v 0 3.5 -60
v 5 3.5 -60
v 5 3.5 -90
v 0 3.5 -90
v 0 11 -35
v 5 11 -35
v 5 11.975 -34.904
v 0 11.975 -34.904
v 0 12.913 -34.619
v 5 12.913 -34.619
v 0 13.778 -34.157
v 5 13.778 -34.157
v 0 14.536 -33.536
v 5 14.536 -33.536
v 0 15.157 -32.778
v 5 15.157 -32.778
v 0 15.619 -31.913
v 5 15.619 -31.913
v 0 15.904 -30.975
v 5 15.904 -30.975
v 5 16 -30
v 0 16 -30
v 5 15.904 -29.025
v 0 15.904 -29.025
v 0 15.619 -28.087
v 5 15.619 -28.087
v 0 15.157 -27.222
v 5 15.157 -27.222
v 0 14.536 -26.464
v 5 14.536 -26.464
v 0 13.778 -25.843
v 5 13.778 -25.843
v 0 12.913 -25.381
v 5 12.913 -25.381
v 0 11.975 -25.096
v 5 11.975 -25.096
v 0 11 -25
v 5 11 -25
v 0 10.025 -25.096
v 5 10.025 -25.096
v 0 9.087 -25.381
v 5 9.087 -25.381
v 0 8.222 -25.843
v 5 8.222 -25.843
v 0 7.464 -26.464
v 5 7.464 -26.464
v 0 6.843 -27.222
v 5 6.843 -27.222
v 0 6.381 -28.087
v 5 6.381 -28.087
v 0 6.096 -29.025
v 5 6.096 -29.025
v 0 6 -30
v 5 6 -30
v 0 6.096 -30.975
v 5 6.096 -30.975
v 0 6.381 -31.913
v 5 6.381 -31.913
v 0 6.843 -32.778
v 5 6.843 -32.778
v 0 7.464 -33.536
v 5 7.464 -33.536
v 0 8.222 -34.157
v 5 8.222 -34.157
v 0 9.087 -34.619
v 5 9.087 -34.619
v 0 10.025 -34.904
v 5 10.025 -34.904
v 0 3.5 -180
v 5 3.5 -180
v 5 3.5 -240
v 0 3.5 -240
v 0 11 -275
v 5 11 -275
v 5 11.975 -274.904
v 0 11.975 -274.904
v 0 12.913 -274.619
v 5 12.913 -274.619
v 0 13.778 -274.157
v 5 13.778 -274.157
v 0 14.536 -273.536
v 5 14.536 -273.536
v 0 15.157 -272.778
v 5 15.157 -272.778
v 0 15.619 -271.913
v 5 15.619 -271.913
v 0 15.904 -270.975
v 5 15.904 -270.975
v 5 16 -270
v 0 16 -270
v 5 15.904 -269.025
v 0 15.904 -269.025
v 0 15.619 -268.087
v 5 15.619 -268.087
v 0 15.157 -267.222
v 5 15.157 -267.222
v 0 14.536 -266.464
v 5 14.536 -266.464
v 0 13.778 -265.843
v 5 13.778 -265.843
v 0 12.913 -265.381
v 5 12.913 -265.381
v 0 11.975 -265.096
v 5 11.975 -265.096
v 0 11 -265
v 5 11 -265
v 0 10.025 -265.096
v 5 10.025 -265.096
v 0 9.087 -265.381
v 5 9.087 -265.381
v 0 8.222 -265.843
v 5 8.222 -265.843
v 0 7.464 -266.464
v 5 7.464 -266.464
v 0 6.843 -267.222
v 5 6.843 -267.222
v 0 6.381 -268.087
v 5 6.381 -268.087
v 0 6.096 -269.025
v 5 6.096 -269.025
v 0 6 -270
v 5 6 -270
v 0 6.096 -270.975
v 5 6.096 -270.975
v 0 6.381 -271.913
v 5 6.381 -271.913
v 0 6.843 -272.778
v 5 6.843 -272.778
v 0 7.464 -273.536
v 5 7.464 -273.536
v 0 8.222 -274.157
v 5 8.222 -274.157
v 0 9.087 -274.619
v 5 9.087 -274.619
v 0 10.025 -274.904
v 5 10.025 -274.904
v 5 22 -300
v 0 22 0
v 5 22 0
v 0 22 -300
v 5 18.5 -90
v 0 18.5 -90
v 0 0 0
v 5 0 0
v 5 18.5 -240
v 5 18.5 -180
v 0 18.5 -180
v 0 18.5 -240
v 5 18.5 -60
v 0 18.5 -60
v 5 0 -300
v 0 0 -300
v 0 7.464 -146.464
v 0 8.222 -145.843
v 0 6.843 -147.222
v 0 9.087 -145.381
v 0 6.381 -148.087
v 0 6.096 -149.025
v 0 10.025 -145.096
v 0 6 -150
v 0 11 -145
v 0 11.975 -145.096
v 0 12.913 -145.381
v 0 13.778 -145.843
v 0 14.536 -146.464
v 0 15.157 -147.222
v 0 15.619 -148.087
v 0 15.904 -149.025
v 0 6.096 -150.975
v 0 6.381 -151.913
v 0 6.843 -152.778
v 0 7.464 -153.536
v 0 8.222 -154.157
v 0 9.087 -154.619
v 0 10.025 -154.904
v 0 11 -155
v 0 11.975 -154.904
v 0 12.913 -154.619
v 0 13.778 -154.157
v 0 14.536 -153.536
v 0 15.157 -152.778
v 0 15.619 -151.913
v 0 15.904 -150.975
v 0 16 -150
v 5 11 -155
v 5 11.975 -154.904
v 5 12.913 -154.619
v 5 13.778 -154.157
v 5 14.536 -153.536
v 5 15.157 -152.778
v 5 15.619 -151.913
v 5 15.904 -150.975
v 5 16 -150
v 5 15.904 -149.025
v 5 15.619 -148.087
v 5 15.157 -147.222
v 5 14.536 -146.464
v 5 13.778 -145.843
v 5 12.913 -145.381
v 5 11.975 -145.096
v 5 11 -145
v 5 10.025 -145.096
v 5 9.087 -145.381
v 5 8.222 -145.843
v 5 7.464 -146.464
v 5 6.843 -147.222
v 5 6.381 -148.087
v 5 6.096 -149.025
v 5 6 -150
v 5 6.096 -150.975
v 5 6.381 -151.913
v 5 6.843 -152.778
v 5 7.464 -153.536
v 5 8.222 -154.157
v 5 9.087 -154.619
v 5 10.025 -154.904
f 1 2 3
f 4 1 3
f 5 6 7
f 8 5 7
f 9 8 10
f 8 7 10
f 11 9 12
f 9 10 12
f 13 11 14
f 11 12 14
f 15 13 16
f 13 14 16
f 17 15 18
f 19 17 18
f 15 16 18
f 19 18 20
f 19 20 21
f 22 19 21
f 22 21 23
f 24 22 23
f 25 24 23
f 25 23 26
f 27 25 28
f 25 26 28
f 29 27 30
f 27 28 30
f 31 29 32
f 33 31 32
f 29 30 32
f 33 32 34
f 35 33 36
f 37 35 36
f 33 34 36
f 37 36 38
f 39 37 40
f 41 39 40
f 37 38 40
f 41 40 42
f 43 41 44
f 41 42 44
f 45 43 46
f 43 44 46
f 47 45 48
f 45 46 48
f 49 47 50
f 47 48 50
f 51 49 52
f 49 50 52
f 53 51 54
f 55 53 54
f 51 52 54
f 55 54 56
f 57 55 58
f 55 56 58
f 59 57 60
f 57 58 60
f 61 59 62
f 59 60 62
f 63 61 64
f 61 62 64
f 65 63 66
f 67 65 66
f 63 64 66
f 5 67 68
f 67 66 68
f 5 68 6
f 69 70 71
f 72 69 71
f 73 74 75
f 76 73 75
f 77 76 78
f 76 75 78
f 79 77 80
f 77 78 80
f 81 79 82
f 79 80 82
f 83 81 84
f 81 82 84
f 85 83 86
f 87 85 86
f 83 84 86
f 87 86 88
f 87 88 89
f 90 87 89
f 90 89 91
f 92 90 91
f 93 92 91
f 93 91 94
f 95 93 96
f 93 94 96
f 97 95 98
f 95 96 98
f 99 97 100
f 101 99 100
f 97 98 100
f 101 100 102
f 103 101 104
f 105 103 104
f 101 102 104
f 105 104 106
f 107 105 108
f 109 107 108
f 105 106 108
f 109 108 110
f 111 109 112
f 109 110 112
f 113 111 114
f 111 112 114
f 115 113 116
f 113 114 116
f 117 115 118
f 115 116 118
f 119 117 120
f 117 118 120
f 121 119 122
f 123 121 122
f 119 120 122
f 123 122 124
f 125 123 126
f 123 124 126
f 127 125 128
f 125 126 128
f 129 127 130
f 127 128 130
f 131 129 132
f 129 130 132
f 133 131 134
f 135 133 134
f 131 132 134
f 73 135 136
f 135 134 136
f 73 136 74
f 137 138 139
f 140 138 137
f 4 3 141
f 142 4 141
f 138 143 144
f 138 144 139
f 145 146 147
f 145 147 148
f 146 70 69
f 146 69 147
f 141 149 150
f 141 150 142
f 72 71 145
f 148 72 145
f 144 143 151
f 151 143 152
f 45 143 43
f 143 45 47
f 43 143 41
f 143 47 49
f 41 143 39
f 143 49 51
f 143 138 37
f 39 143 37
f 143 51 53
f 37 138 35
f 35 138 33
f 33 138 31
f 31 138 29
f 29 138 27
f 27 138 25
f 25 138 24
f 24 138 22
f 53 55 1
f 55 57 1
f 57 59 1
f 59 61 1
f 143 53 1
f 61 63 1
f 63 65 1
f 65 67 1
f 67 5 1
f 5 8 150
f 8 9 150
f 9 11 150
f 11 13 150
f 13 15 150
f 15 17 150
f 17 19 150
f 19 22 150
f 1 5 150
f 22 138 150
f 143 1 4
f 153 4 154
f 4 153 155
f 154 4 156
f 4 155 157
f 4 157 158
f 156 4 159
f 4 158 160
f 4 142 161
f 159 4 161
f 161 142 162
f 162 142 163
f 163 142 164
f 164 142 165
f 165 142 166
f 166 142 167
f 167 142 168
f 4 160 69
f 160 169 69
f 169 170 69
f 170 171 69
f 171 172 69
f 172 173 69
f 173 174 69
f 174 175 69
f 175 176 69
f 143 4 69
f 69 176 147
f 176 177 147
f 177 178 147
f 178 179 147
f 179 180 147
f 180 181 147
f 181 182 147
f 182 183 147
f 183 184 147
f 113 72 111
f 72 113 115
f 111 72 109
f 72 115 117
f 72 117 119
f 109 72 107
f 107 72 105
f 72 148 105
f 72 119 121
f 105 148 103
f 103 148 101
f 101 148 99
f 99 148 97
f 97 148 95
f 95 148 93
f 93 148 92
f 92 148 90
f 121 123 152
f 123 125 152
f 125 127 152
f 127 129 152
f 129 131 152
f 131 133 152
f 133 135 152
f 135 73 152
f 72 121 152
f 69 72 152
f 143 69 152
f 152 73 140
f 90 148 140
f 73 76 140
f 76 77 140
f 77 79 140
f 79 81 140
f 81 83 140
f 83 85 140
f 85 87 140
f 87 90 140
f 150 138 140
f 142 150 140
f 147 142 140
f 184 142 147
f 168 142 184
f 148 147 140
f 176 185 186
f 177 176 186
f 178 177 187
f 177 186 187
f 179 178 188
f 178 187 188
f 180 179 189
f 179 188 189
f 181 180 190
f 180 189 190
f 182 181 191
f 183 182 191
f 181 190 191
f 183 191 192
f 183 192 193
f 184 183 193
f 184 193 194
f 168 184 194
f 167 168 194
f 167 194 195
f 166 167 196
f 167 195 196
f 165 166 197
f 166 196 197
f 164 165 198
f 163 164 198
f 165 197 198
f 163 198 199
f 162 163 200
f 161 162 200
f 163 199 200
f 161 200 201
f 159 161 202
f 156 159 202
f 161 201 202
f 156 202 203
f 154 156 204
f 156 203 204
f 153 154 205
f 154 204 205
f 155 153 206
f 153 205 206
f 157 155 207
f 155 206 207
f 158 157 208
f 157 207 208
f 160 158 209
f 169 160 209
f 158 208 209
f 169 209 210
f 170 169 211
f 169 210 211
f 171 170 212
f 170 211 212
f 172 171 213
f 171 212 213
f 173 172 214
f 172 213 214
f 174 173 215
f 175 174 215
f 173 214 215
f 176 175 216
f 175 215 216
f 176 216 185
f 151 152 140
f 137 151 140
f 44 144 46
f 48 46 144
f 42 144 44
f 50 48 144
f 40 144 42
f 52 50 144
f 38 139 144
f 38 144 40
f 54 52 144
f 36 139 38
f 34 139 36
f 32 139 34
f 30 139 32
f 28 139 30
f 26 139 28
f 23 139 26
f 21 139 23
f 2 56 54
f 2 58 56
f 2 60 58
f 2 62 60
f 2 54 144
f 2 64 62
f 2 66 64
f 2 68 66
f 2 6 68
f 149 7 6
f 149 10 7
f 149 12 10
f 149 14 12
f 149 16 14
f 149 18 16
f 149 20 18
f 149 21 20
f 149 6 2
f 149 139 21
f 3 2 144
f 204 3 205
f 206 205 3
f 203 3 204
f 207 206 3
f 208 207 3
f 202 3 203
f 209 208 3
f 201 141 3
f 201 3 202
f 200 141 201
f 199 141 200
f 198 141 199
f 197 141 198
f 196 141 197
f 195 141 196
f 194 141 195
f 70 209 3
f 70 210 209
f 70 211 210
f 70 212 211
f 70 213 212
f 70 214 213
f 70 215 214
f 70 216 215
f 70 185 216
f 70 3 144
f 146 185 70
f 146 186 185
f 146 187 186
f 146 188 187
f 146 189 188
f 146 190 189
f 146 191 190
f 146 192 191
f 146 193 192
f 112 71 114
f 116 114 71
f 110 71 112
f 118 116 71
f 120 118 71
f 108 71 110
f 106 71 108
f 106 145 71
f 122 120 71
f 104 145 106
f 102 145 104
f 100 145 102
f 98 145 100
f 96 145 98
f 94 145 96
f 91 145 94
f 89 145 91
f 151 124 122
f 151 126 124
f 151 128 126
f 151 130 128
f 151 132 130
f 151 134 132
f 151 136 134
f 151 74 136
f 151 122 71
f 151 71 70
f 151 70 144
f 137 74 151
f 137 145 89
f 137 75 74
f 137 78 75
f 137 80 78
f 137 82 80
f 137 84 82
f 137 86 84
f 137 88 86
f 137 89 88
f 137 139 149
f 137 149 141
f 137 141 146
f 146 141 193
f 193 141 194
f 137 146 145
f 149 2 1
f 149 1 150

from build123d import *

# Parameters (mm, degrees)
SKETCH1_W           = 300
SKETCH1_H           = 22
BOSS_EXTRUDE1_DEPTH = 5
SKETCH2_R           = 5
SKETCH2_W           = 30
SKETCH2_H           = 15
SKETCH2_W_2         = 60
CUT_EXTRUDE1_DEPTH  = 5


with BuildPart() as part:
    # Sketch1 → Boss-Extrude1 (new body)
    with BuildSketch(Plane(origin=(0, 0, 0), x_dir=(0, 0, -1), z_dir=(1, 0, 0))):
        with Locations((150, 11)):
            Rectangle(SKETCH1_W, SKETCH1_H)
    extrude(amount=BOSS_EXTRUDE1_DEPTH)

    # Sketch2 → Cut-Extrude1 (cut)
    with BuildSketch(Plane(origin=(5, 0, 0), x_dir=(0, 0, -1), z_dir=(1, 0, 0))):
        with Locations((30, 11)):
            Circle(SKETCH2_R)
        with Locations((150, 11)):
            Circle(SKETCH2_R)
        with Locations((270, 11)):
            Circle(SKETCH2_R)
        with Locations((75, 11)):
            Rectangle(SKETCH2_W, SKETCH2_H)
        with Locations((210, 11)):
            Rectangle(SKETCH2_W_2, SKETCH2_H)
    extrude(amount=-CUT_EXTRUDE1_DEPTH, mode=Mode.SUBTRACT)


solid = part.part
